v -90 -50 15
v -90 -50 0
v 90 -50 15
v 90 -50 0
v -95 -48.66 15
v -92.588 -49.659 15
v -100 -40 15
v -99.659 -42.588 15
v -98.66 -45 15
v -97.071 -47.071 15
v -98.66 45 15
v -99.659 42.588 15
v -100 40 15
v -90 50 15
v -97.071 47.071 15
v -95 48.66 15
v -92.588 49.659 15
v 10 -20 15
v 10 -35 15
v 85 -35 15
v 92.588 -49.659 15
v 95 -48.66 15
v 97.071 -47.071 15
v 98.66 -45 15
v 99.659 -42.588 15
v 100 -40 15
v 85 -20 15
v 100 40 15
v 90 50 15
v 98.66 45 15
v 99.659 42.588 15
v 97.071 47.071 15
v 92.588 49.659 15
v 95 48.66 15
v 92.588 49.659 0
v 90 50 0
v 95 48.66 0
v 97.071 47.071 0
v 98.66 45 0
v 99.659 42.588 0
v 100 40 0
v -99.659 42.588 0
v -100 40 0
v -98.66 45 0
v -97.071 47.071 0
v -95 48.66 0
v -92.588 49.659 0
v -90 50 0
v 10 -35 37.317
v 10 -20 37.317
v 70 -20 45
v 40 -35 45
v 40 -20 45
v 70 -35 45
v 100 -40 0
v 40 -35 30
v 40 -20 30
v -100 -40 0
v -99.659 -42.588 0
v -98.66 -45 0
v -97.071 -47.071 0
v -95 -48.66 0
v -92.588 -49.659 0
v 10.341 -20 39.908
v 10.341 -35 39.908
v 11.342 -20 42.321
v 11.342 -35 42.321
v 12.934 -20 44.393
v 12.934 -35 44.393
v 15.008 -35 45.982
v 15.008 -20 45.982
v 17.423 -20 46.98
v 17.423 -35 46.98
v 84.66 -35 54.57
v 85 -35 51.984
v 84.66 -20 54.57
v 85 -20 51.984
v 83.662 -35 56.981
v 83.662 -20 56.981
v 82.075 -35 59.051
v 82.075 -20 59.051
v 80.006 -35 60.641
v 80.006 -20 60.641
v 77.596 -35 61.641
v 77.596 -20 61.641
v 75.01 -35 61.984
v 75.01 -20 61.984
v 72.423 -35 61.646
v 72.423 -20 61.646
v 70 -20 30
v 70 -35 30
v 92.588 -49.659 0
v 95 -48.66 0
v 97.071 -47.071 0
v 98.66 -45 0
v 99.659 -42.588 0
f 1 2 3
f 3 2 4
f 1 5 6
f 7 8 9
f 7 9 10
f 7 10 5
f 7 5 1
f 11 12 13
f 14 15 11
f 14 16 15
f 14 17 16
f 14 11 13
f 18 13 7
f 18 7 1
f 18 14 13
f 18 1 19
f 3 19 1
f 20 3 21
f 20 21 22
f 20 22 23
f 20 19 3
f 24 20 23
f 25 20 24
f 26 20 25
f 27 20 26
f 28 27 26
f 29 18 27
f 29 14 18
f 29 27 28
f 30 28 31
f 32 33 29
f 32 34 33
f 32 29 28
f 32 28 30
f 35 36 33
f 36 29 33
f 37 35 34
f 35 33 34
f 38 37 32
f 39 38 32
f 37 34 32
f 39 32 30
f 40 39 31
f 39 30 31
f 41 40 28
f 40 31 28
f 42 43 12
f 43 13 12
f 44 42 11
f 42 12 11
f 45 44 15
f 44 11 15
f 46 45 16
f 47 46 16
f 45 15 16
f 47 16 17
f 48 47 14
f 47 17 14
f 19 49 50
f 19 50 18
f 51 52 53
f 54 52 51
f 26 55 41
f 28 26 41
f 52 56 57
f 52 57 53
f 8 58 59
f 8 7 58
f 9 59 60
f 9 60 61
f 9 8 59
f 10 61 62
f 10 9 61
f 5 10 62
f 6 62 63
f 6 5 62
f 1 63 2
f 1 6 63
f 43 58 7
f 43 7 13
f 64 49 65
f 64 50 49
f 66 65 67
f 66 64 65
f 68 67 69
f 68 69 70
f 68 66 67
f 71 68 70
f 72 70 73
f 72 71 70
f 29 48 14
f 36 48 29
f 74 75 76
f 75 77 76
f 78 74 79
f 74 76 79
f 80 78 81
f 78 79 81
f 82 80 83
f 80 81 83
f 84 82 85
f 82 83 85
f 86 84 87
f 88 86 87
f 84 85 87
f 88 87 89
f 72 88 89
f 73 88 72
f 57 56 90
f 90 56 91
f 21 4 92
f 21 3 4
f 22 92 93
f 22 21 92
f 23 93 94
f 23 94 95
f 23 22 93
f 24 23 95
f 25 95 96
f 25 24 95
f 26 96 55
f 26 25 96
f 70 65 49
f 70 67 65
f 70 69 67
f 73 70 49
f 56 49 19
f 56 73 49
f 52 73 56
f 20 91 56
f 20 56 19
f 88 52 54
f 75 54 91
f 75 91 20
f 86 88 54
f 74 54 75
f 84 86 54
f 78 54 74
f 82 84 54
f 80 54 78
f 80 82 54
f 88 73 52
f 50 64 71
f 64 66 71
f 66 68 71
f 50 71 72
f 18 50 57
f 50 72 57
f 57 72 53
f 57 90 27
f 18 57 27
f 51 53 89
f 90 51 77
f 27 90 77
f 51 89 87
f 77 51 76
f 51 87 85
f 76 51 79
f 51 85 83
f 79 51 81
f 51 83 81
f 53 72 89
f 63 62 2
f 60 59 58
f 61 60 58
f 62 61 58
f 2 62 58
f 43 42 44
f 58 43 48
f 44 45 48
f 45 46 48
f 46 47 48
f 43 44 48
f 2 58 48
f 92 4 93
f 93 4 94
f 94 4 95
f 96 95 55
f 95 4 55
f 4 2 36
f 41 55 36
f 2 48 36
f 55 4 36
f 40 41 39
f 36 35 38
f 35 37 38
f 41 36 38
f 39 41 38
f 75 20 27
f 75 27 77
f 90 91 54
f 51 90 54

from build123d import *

# Parameters (mm, degrees)
F0_W     = 200
F0_H     = 100
F1_DEPTH = 15
F4_DEPTH = 15
F5_W     = 30
F5_H     = 15
F6_DEPTH = 15
F7_R     = 10


with BuildPart() as f1:
    # F0 (on Top) → F1 (new body)
    with BuildSketch(Plane.XY):
        Rectangle(F0_W, F0_H)
    extrude(amount=F1_DEPTH)

    # F3 (on offset) → F4 (join)
    with BuildSketch(Plane.XZ.offset(35)):
        Polygon((10, 15), (85, 15), (85, 65), (10, 45), align=None)
    extrude(amount=-F4_DEPTH)

    # F5 (on face) → F6 (cut, through all)
    with BuildSketch(Plane.XZ.offset(35)):
        with Locations((55, 37.5)):
            Rectangle(F5_W, F5_H)
    extrude(amount=-F6_DEPTH, mode=Mode.SUBTRACT)

    # F7
    f7_edges = [f1.edges().sort_by_distance(p)[0] for p in [
        (10, -27.5, 45),
        (85, -27.5, 65),
        (100, -50, 7.5),
        (-100, -50, 7.5),
        (-100, 50, 7.5),
        (100, 50, 7.5),
    ]]
    fillet(f7_edges, radius=F7_R)


solid = f1.part
